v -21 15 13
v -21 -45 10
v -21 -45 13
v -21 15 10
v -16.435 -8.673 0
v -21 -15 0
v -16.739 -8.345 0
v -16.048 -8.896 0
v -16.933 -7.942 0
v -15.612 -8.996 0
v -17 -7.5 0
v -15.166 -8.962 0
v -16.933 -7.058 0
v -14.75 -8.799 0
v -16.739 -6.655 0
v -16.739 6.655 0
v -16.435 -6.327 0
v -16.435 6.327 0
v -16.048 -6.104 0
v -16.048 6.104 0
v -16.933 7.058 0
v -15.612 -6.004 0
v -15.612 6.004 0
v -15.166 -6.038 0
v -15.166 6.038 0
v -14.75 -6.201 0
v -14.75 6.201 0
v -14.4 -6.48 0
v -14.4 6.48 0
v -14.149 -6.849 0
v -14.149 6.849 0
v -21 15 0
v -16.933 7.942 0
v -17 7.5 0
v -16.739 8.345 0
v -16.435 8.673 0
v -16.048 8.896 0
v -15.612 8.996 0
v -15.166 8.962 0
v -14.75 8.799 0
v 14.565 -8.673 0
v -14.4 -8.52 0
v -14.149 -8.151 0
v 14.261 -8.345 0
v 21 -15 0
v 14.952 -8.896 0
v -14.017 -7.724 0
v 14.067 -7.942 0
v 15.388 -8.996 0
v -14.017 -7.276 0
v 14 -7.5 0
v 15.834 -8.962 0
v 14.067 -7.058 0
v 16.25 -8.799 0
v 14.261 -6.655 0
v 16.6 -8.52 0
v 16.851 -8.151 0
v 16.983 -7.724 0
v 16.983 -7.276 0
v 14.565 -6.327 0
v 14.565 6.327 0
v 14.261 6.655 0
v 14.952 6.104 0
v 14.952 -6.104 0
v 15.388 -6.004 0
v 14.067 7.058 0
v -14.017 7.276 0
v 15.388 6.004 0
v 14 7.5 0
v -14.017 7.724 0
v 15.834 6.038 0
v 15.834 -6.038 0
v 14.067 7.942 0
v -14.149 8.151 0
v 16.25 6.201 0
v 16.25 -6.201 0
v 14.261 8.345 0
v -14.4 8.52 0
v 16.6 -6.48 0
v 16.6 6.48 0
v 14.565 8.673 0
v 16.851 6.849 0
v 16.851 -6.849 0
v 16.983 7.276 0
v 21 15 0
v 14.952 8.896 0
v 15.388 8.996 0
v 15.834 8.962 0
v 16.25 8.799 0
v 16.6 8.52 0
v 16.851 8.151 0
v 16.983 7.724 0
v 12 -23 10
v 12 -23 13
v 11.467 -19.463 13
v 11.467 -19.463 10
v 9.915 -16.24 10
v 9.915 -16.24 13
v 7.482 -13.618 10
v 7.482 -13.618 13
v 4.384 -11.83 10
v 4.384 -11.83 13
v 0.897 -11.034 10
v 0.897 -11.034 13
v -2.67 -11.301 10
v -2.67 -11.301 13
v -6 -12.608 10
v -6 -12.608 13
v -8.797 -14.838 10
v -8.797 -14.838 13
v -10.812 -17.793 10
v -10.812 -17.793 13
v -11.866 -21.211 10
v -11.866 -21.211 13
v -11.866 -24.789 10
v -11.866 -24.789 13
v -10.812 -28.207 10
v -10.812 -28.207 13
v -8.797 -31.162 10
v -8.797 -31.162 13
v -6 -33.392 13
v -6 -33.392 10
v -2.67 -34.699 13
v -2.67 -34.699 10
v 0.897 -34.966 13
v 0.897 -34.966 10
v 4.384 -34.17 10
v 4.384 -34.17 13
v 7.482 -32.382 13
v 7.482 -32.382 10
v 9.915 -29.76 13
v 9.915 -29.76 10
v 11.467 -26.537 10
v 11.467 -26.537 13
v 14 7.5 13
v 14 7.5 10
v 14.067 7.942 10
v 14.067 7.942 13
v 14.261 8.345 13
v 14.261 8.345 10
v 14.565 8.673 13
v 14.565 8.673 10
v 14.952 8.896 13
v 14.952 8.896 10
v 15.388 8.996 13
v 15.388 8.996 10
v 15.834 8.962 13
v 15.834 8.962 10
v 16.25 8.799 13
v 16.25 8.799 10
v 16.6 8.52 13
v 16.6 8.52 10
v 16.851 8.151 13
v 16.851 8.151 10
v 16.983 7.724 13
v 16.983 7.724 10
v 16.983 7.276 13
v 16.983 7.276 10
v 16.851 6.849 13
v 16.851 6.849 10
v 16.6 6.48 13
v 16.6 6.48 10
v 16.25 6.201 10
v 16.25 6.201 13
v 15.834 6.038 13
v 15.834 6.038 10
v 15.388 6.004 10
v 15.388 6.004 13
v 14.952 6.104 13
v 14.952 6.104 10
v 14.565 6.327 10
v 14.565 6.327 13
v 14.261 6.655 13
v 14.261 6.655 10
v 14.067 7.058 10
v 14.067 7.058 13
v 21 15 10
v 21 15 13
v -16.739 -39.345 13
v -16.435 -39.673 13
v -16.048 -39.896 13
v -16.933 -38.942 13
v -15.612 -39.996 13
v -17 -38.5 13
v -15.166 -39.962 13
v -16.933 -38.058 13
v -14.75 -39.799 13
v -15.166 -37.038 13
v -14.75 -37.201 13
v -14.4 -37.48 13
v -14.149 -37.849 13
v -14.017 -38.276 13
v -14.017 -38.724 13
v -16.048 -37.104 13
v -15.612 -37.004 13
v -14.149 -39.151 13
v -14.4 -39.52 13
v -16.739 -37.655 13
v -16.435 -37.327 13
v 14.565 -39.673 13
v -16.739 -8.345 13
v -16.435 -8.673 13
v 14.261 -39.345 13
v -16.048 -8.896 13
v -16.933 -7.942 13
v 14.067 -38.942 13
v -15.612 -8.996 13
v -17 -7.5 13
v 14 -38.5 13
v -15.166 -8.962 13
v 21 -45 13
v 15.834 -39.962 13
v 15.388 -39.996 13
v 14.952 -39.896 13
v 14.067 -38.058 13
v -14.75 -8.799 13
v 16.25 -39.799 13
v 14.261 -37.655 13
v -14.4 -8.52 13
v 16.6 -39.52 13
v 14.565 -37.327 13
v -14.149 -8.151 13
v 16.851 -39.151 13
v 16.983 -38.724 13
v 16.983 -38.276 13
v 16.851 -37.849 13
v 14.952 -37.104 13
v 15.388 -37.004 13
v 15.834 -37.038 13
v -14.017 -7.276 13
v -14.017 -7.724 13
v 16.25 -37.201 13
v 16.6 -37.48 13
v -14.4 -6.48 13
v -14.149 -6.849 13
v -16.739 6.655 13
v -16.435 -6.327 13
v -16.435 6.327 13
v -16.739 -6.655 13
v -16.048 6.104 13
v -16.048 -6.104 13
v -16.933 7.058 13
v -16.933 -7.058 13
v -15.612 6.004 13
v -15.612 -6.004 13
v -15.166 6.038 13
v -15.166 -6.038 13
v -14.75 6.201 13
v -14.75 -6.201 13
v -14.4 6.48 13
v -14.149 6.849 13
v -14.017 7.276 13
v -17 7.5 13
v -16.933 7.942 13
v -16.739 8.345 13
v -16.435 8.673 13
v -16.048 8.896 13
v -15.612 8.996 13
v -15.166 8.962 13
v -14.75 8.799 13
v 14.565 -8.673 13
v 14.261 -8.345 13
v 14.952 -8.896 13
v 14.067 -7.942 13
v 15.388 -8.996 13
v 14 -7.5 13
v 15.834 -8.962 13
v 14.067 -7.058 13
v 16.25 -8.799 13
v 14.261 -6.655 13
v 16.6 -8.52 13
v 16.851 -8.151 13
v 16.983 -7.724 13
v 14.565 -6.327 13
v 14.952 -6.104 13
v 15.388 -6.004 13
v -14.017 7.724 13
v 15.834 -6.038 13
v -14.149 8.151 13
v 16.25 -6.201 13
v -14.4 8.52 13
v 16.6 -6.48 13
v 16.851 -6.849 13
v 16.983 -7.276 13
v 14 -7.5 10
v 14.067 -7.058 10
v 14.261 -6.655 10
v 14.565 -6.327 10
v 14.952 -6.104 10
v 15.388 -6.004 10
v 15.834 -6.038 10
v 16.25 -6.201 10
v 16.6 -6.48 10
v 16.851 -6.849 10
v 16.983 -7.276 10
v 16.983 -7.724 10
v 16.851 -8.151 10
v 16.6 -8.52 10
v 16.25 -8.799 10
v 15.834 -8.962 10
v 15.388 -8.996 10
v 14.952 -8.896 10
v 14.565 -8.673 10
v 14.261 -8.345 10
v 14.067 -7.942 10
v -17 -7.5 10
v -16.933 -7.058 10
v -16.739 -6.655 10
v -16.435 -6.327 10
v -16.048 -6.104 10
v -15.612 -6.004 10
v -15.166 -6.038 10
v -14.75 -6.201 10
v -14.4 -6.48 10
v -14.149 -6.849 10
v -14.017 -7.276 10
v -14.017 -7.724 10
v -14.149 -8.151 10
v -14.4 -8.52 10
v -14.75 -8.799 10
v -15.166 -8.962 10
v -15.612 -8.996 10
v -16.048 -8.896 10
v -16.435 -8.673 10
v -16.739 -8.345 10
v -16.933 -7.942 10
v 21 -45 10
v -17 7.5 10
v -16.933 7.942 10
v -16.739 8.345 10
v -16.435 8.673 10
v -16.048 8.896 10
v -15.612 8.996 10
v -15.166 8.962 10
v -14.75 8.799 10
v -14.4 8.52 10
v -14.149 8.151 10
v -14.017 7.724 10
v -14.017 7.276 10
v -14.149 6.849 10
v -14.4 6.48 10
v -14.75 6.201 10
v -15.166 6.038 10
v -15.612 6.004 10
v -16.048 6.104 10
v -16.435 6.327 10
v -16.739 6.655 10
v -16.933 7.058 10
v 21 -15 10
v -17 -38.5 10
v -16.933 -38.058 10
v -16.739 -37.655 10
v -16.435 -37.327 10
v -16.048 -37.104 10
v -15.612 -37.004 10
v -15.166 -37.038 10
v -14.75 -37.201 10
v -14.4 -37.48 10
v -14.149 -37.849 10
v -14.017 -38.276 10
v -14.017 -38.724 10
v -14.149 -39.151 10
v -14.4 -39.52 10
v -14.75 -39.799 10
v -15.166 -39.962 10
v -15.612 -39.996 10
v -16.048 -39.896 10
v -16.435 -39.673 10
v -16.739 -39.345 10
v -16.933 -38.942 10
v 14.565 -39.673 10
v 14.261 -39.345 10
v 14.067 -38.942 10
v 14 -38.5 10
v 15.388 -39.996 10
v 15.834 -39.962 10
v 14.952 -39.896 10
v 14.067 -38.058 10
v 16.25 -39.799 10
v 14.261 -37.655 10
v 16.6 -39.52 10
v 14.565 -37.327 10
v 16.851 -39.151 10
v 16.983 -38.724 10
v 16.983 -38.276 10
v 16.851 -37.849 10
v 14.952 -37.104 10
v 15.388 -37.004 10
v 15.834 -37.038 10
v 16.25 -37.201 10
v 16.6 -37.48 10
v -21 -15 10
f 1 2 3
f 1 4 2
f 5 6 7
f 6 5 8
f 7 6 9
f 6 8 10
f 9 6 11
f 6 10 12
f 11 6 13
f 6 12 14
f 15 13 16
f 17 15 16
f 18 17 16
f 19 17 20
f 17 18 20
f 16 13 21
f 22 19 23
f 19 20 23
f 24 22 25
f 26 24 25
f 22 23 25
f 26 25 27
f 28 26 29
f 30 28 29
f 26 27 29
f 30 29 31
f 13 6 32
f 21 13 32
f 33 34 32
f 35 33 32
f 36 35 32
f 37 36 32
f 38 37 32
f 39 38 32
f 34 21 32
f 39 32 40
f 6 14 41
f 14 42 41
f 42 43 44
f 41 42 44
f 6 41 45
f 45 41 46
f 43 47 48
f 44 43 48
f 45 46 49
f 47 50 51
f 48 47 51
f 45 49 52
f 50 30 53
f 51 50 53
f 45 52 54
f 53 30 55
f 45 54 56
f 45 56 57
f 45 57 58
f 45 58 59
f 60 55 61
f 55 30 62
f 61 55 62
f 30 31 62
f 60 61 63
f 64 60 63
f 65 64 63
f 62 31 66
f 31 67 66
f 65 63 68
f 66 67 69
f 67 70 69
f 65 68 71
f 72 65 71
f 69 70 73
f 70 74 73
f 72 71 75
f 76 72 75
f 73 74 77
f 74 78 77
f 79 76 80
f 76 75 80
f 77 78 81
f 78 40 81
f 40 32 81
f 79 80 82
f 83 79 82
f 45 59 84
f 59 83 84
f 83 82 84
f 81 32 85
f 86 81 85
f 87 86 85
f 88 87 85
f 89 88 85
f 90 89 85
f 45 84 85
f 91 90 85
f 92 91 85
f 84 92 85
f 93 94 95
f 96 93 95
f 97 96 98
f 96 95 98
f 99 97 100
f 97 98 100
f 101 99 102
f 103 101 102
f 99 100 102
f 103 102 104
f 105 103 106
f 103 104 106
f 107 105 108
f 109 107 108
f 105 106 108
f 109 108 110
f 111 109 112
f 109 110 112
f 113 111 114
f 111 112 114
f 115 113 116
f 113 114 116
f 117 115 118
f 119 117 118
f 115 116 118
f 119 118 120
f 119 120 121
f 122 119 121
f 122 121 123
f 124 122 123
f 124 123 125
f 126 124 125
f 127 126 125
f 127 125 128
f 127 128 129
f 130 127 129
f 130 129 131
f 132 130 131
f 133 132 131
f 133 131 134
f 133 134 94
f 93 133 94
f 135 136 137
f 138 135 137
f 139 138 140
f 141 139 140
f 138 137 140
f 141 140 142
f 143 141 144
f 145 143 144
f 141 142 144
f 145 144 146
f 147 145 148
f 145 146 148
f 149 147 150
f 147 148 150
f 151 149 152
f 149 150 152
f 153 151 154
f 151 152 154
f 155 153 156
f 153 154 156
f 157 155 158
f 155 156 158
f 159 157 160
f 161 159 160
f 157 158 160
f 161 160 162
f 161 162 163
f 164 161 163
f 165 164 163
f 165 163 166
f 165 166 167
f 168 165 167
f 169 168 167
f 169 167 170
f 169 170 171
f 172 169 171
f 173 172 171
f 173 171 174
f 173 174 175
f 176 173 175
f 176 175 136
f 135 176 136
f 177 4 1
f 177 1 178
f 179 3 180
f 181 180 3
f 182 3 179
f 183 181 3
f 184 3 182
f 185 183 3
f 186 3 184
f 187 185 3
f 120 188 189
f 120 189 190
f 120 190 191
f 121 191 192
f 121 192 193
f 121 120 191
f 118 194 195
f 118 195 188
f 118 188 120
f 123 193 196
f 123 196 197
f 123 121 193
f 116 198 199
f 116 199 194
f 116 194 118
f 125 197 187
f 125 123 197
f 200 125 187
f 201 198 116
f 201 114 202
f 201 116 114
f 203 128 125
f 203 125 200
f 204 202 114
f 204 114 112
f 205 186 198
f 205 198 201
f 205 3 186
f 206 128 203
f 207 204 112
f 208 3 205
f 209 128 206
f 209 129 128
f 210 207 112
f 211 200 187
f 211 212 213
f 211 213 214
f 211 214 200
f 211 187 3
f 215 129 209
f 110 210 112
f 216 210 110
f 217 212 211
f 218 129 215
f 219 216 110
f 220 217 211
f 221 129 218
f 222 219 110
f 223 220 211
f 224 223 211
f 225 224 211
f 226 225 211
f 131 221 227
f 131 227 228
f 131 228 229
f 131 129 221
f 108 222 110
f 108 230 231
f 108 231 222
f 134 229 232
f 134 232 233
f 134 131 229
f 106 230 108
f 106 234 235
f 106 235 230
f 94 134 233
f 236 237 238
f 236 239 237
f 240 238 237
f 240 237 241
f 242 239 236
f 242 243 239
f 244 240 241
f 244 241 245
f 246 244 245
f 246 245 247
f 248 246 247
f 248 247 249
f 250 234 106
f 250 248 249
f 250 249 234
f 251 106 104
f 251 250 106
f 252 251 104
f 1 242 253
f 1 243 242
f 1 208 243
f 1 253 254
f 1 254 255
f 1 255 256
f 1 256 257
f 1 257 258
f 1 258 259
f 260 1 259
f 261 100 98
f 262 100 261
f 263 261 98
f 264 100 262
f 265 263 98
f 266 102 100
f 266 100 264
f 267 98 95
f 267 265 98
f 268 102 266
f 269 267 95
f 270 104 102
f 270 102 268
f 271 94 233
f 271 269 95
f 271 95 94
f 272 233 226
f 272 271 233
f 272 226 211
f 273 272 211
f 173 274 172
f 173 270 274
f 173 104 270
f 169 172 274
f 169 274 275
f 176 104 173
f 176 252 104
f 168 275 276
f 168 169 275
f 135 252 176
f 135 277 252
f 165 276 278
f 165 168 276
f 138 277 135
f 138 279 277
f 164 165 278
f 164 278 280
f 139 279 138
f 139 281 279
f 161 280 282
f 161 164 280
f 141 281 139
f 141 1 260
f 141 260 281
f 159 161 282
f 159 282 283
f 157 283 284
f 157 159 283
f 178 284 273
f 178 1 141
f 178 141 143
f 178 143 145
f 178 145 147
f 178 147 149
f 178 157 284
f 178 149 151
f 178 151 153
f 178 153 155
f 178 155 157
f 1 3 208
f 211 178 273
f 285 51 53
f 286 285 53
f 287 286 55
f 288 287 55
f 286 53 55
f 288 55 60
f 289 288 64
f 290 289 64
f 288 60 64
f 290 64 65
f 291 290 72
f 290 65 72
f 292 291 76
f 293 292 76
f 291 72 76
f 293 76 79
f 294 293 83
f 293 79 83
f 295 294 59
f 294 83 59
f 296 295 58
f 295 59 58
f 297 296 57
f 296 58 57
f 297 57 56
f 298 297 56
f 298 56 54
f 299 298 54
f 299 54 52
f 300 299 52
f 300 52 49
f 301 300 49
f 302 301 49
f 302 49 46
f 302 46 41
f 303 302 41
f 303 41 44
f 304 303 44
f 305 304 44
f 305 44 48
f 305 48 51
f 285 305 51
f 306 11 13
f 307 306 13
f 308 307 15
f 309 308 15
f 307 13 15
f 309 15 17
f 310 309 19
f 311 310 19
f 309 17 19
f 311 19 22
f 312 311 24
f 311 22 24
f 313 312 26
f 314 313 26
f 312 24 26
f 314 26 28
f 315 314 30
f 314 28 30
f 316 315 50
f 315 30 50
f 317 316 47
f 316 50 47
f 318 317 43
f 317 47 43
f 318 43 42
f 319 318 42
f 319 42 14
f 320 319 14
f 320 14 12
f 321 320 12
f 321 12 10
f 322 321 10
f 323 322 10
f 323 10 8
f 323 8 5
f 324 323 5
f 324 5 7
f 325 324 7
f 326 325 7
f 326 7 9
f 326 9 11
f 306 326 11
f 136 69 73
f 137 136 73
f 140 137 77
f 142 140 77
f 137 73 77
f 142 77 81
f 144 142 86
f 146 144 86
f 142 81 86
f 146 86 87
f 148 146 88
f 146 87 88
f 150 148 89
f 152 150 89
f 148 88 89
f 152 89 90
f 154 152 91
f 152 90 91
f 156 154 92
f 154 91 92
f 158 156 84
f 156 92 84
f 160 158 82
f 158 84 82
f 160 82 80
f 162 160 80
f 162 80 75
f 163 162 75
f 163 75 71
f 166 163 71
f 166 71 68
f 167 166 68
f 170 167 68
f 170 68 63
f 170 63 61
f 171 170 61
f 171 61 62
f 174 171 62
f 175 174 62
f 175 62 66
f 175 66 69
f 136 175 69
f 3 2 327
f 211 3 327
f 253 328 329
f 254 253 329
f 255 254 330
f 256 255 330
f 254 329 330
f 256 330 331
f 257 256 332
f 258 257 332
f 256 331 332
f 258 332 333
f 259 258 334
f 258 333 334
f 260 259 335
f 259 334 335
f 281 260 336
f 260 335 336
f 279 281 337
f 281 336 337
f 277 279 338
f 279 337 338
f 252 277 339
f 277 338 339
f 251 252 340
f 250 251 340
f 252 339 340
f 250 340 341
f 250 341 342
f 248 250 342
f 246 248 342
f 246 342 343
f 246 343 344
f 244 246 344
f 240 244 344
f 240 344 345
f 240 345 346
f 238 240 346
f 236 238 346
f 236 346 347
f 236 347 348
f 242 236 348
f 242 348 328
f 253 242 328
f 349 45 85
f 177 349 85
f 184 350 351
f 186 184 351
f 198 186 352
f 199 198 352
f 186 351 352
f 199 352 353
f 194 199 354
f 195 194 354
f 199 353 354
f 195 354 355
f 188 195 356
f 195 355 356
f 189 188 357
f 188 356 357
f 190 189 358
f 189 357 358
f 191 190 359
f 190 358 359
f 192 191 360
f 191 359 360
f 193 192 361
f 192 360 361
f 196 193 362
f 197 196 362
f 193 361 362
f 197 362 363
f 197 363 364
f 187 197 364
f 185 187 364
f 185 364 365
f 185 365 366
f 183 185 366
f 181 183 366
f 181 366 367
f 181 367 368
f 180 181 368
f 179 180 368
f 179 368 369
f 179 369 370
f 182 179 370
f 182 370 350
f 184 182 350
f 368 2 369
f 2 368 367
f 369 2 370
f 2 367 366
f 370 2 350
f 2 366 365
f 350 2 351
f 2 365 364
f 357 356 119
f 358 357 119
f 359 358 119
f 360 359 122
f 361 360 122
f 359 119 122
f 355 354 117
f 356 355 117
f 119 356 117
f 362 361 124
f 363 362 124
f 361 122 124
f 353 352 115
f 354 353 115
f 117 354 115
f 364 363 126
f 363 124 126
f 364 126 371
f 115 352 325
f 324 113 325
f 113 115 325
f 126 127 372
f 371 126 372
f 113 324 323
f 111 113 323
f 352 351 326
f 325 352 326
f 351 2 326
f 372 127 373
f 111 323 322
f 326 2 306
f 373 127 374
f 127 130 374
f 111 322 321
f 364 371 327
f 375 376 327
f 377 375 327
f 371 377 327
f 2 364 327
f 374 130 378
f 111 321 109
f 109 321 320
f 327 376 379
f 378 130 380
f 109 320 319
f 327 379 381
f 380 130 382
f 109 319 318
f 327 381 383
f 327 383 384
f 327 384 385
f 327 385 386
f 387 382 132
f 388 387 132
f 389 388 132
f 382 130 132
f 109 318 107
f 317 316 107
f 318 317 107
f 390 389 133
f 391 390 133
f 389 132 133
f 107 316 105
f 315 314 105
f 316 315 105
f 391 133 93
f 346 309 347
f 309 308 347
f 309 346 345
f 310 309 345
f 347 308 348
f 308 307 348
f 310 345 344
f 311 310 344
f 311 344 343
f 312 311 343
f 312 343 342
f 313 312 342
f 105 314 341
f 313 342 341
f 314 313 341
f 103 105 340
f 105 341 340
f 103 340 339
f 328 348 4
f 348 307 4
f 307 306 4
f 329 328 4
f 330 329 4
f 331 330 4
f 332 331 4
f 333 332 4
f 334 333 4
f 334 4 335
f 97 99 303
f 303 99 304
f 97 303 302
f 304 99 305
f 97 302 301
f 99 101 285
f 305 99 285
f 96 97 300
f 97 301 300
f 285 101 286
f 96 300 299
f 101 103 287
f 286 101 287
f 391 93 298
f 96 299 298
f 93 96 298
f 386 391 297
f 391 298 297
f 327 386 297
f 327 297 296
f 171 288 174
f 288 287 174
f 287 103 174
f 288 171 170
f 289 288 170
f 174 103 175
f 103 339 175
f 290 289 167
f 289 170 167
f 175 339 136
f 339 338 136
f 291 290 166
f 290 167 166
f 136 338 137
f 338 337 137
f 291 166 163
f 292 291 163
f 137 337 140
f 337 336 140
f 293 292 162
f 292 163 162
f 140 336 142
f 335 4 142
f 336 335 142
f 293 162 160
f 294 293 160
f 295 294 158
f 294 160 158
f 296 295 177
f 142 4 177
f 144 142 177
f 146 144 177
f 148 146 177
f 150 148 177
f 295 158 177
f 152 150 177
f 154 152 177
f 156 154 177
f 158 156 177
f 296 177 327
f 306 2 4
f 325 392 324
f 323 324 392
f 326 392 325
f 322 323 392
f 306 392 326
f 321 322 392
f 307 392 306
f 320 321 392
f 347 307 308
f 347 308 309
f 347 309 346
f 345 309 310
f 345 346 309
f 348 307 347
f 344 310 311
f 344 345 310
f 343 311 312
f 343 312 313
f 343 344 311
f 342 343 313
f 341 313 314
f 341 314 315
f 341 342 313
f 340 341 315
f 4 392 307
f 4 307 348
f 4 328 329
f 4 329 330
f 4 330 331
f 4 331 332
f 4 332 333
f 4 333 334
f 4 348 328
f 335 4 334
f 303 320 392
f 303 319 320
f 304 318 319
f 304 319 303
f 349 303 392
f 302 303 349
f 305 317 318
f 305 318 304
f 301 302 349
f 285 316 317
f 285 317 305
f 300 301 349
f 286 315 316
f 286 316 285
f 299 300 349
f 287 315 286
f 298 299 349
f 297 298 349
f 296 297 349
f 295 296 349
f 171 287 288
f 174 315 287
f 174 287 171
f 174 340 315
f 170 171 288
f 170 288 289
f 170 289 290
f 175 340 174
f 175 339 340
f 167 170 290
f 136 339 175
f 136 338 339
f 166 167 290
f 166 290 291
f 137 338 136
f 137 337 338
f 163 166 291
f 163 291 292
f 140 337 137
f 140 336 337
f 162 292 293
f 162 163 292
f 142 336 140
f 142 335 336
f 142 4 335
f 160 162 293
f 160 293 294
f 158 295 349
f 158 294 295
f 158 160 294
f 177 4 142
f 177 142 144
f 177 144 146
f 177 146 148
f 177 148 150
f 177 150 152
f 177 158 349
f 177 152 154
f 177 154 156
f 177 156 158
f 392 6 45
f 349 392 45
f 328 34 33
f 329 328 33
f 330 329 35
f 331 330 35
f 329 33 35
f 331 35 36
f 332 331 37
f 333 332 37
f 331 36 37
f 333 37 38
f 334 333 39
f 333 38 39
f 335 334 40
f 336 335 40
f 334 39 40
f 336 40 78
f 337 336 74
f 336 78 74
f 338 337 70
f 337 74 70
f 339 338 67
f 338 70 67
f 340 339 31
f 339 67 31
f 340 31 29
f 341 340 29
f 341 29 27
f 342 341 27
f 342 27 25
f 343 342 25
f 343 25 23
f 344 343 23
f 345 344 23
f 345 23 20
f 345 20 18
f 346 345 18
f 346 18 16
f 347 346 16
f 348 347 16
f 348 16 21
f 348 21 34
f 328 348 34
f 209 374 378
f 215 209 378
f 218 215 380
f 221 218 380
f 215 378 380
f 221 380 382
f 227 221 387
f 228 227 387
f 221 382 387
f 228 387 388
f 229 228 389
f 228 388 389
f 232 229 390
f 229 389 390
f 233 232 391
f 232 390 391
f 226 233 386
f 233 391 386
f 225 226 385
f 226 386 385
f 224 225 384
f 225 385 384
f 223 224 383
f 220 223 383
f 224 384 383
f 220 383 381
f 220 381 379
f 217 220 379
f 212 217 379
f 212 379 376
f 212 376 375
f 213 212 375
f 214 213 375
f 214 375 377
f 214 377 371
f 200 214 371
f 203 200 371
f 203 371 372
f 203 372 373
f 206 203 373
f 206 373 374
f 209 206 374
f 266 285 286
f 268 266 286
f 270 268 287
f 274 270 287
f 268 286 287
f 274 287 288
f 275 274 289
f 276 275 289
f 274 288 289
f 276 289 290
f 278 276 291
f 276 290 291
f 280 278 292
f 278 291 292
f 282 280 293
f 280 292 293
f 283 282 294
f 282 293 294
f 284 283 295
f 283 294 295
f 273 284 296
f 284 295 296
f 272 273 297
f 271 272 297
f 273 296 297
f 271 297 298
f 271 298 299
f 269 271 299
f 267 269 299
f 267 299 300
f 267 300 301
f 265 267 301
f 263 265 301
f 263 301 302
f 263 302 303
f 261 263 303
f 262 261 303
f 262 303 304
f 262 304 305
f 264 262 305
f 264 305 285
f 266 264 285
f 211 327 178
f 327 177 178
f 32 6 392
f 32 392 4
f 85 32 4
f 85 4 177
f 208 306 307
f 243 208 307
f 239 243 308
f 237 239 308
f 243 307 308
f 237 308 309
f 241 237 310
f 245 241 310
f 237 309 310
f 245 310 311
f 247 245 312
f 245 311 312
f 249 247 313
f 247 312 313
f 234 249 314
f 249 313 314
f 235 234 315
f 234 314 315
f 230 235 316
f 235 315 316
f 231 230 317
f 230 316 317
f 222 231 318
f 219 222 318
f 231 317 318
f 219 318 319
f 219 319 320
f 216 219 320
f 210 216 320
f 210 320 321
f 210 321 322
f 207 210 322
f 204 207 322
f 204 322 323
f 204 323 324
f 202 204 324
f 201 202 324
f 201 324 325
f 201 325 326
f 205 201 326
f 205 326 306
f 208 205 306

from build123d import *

# Parameters (mm, degrees)
F0_W     = 42
F0_H     = 30
F1_DEPTH = 10
F2_DEPTH = 3
F3_DEPTH = 30
F5_D     = 3
F5_2_D   = 3
F4_R     = 12
F6_DEPTH = 25


with BuildPart() as f1:
    # F0 (on Top) → F1 (new body)
    with BuildSketch(Plane.XY):
        Rectangle(F0_W, F0_H)
    extrude(amount=F1_DEPTH)


with BuildPart() as f2:
    # F2 (new): a face of the model
    f2_faces = [f1.part.faces().sort_by_distance(p)[0] for p in [
        (0, 0, 10),
    ]]
    extrude(f2_faces, amount=F2_DEPTH)

    # F3 (add): a face of the model
    f3_faces = [f2.faces().sort_by_distance(p)[0] for p in [
        (0, -15, 11.5),
    ]]
    extrude(f3_faces, amount=F3_DEPTH)

    # F5#2 (through all)
    with Locations(Plane.XY.offset(13)):
        with Locations((-15.5, -7.5), (-15.5, 7.5), (15.5, 7.5), (15.5, -7.5), (15.5, -38.5), (-15.5, -38.5)):
            Hole(F5_2_D / 2)

    # F4 (on face) → F6 (cut)
    with BuildSketch(Plane.XY.offset(13)):
        with Locations((0, -23)):
            Circle(F4_R)
    extrude(amount=-F6_DEPTH, mode=Mode.SUBTRACT)


with BuildPart() as f1_1:
    add(f1.part)

    # F5 (through all)
    with Locations(Plane.XY.offset(13)):
        with Locations((-15.5, -7.5), (-15.5, 7.5), (15.5, 7.5), (15.5, -7.5), (15.5, -38.5), (-15.5, -38.5)):
            Hole(F5_D / 2)


solid = Compound([f2.part, f1_1.part])
